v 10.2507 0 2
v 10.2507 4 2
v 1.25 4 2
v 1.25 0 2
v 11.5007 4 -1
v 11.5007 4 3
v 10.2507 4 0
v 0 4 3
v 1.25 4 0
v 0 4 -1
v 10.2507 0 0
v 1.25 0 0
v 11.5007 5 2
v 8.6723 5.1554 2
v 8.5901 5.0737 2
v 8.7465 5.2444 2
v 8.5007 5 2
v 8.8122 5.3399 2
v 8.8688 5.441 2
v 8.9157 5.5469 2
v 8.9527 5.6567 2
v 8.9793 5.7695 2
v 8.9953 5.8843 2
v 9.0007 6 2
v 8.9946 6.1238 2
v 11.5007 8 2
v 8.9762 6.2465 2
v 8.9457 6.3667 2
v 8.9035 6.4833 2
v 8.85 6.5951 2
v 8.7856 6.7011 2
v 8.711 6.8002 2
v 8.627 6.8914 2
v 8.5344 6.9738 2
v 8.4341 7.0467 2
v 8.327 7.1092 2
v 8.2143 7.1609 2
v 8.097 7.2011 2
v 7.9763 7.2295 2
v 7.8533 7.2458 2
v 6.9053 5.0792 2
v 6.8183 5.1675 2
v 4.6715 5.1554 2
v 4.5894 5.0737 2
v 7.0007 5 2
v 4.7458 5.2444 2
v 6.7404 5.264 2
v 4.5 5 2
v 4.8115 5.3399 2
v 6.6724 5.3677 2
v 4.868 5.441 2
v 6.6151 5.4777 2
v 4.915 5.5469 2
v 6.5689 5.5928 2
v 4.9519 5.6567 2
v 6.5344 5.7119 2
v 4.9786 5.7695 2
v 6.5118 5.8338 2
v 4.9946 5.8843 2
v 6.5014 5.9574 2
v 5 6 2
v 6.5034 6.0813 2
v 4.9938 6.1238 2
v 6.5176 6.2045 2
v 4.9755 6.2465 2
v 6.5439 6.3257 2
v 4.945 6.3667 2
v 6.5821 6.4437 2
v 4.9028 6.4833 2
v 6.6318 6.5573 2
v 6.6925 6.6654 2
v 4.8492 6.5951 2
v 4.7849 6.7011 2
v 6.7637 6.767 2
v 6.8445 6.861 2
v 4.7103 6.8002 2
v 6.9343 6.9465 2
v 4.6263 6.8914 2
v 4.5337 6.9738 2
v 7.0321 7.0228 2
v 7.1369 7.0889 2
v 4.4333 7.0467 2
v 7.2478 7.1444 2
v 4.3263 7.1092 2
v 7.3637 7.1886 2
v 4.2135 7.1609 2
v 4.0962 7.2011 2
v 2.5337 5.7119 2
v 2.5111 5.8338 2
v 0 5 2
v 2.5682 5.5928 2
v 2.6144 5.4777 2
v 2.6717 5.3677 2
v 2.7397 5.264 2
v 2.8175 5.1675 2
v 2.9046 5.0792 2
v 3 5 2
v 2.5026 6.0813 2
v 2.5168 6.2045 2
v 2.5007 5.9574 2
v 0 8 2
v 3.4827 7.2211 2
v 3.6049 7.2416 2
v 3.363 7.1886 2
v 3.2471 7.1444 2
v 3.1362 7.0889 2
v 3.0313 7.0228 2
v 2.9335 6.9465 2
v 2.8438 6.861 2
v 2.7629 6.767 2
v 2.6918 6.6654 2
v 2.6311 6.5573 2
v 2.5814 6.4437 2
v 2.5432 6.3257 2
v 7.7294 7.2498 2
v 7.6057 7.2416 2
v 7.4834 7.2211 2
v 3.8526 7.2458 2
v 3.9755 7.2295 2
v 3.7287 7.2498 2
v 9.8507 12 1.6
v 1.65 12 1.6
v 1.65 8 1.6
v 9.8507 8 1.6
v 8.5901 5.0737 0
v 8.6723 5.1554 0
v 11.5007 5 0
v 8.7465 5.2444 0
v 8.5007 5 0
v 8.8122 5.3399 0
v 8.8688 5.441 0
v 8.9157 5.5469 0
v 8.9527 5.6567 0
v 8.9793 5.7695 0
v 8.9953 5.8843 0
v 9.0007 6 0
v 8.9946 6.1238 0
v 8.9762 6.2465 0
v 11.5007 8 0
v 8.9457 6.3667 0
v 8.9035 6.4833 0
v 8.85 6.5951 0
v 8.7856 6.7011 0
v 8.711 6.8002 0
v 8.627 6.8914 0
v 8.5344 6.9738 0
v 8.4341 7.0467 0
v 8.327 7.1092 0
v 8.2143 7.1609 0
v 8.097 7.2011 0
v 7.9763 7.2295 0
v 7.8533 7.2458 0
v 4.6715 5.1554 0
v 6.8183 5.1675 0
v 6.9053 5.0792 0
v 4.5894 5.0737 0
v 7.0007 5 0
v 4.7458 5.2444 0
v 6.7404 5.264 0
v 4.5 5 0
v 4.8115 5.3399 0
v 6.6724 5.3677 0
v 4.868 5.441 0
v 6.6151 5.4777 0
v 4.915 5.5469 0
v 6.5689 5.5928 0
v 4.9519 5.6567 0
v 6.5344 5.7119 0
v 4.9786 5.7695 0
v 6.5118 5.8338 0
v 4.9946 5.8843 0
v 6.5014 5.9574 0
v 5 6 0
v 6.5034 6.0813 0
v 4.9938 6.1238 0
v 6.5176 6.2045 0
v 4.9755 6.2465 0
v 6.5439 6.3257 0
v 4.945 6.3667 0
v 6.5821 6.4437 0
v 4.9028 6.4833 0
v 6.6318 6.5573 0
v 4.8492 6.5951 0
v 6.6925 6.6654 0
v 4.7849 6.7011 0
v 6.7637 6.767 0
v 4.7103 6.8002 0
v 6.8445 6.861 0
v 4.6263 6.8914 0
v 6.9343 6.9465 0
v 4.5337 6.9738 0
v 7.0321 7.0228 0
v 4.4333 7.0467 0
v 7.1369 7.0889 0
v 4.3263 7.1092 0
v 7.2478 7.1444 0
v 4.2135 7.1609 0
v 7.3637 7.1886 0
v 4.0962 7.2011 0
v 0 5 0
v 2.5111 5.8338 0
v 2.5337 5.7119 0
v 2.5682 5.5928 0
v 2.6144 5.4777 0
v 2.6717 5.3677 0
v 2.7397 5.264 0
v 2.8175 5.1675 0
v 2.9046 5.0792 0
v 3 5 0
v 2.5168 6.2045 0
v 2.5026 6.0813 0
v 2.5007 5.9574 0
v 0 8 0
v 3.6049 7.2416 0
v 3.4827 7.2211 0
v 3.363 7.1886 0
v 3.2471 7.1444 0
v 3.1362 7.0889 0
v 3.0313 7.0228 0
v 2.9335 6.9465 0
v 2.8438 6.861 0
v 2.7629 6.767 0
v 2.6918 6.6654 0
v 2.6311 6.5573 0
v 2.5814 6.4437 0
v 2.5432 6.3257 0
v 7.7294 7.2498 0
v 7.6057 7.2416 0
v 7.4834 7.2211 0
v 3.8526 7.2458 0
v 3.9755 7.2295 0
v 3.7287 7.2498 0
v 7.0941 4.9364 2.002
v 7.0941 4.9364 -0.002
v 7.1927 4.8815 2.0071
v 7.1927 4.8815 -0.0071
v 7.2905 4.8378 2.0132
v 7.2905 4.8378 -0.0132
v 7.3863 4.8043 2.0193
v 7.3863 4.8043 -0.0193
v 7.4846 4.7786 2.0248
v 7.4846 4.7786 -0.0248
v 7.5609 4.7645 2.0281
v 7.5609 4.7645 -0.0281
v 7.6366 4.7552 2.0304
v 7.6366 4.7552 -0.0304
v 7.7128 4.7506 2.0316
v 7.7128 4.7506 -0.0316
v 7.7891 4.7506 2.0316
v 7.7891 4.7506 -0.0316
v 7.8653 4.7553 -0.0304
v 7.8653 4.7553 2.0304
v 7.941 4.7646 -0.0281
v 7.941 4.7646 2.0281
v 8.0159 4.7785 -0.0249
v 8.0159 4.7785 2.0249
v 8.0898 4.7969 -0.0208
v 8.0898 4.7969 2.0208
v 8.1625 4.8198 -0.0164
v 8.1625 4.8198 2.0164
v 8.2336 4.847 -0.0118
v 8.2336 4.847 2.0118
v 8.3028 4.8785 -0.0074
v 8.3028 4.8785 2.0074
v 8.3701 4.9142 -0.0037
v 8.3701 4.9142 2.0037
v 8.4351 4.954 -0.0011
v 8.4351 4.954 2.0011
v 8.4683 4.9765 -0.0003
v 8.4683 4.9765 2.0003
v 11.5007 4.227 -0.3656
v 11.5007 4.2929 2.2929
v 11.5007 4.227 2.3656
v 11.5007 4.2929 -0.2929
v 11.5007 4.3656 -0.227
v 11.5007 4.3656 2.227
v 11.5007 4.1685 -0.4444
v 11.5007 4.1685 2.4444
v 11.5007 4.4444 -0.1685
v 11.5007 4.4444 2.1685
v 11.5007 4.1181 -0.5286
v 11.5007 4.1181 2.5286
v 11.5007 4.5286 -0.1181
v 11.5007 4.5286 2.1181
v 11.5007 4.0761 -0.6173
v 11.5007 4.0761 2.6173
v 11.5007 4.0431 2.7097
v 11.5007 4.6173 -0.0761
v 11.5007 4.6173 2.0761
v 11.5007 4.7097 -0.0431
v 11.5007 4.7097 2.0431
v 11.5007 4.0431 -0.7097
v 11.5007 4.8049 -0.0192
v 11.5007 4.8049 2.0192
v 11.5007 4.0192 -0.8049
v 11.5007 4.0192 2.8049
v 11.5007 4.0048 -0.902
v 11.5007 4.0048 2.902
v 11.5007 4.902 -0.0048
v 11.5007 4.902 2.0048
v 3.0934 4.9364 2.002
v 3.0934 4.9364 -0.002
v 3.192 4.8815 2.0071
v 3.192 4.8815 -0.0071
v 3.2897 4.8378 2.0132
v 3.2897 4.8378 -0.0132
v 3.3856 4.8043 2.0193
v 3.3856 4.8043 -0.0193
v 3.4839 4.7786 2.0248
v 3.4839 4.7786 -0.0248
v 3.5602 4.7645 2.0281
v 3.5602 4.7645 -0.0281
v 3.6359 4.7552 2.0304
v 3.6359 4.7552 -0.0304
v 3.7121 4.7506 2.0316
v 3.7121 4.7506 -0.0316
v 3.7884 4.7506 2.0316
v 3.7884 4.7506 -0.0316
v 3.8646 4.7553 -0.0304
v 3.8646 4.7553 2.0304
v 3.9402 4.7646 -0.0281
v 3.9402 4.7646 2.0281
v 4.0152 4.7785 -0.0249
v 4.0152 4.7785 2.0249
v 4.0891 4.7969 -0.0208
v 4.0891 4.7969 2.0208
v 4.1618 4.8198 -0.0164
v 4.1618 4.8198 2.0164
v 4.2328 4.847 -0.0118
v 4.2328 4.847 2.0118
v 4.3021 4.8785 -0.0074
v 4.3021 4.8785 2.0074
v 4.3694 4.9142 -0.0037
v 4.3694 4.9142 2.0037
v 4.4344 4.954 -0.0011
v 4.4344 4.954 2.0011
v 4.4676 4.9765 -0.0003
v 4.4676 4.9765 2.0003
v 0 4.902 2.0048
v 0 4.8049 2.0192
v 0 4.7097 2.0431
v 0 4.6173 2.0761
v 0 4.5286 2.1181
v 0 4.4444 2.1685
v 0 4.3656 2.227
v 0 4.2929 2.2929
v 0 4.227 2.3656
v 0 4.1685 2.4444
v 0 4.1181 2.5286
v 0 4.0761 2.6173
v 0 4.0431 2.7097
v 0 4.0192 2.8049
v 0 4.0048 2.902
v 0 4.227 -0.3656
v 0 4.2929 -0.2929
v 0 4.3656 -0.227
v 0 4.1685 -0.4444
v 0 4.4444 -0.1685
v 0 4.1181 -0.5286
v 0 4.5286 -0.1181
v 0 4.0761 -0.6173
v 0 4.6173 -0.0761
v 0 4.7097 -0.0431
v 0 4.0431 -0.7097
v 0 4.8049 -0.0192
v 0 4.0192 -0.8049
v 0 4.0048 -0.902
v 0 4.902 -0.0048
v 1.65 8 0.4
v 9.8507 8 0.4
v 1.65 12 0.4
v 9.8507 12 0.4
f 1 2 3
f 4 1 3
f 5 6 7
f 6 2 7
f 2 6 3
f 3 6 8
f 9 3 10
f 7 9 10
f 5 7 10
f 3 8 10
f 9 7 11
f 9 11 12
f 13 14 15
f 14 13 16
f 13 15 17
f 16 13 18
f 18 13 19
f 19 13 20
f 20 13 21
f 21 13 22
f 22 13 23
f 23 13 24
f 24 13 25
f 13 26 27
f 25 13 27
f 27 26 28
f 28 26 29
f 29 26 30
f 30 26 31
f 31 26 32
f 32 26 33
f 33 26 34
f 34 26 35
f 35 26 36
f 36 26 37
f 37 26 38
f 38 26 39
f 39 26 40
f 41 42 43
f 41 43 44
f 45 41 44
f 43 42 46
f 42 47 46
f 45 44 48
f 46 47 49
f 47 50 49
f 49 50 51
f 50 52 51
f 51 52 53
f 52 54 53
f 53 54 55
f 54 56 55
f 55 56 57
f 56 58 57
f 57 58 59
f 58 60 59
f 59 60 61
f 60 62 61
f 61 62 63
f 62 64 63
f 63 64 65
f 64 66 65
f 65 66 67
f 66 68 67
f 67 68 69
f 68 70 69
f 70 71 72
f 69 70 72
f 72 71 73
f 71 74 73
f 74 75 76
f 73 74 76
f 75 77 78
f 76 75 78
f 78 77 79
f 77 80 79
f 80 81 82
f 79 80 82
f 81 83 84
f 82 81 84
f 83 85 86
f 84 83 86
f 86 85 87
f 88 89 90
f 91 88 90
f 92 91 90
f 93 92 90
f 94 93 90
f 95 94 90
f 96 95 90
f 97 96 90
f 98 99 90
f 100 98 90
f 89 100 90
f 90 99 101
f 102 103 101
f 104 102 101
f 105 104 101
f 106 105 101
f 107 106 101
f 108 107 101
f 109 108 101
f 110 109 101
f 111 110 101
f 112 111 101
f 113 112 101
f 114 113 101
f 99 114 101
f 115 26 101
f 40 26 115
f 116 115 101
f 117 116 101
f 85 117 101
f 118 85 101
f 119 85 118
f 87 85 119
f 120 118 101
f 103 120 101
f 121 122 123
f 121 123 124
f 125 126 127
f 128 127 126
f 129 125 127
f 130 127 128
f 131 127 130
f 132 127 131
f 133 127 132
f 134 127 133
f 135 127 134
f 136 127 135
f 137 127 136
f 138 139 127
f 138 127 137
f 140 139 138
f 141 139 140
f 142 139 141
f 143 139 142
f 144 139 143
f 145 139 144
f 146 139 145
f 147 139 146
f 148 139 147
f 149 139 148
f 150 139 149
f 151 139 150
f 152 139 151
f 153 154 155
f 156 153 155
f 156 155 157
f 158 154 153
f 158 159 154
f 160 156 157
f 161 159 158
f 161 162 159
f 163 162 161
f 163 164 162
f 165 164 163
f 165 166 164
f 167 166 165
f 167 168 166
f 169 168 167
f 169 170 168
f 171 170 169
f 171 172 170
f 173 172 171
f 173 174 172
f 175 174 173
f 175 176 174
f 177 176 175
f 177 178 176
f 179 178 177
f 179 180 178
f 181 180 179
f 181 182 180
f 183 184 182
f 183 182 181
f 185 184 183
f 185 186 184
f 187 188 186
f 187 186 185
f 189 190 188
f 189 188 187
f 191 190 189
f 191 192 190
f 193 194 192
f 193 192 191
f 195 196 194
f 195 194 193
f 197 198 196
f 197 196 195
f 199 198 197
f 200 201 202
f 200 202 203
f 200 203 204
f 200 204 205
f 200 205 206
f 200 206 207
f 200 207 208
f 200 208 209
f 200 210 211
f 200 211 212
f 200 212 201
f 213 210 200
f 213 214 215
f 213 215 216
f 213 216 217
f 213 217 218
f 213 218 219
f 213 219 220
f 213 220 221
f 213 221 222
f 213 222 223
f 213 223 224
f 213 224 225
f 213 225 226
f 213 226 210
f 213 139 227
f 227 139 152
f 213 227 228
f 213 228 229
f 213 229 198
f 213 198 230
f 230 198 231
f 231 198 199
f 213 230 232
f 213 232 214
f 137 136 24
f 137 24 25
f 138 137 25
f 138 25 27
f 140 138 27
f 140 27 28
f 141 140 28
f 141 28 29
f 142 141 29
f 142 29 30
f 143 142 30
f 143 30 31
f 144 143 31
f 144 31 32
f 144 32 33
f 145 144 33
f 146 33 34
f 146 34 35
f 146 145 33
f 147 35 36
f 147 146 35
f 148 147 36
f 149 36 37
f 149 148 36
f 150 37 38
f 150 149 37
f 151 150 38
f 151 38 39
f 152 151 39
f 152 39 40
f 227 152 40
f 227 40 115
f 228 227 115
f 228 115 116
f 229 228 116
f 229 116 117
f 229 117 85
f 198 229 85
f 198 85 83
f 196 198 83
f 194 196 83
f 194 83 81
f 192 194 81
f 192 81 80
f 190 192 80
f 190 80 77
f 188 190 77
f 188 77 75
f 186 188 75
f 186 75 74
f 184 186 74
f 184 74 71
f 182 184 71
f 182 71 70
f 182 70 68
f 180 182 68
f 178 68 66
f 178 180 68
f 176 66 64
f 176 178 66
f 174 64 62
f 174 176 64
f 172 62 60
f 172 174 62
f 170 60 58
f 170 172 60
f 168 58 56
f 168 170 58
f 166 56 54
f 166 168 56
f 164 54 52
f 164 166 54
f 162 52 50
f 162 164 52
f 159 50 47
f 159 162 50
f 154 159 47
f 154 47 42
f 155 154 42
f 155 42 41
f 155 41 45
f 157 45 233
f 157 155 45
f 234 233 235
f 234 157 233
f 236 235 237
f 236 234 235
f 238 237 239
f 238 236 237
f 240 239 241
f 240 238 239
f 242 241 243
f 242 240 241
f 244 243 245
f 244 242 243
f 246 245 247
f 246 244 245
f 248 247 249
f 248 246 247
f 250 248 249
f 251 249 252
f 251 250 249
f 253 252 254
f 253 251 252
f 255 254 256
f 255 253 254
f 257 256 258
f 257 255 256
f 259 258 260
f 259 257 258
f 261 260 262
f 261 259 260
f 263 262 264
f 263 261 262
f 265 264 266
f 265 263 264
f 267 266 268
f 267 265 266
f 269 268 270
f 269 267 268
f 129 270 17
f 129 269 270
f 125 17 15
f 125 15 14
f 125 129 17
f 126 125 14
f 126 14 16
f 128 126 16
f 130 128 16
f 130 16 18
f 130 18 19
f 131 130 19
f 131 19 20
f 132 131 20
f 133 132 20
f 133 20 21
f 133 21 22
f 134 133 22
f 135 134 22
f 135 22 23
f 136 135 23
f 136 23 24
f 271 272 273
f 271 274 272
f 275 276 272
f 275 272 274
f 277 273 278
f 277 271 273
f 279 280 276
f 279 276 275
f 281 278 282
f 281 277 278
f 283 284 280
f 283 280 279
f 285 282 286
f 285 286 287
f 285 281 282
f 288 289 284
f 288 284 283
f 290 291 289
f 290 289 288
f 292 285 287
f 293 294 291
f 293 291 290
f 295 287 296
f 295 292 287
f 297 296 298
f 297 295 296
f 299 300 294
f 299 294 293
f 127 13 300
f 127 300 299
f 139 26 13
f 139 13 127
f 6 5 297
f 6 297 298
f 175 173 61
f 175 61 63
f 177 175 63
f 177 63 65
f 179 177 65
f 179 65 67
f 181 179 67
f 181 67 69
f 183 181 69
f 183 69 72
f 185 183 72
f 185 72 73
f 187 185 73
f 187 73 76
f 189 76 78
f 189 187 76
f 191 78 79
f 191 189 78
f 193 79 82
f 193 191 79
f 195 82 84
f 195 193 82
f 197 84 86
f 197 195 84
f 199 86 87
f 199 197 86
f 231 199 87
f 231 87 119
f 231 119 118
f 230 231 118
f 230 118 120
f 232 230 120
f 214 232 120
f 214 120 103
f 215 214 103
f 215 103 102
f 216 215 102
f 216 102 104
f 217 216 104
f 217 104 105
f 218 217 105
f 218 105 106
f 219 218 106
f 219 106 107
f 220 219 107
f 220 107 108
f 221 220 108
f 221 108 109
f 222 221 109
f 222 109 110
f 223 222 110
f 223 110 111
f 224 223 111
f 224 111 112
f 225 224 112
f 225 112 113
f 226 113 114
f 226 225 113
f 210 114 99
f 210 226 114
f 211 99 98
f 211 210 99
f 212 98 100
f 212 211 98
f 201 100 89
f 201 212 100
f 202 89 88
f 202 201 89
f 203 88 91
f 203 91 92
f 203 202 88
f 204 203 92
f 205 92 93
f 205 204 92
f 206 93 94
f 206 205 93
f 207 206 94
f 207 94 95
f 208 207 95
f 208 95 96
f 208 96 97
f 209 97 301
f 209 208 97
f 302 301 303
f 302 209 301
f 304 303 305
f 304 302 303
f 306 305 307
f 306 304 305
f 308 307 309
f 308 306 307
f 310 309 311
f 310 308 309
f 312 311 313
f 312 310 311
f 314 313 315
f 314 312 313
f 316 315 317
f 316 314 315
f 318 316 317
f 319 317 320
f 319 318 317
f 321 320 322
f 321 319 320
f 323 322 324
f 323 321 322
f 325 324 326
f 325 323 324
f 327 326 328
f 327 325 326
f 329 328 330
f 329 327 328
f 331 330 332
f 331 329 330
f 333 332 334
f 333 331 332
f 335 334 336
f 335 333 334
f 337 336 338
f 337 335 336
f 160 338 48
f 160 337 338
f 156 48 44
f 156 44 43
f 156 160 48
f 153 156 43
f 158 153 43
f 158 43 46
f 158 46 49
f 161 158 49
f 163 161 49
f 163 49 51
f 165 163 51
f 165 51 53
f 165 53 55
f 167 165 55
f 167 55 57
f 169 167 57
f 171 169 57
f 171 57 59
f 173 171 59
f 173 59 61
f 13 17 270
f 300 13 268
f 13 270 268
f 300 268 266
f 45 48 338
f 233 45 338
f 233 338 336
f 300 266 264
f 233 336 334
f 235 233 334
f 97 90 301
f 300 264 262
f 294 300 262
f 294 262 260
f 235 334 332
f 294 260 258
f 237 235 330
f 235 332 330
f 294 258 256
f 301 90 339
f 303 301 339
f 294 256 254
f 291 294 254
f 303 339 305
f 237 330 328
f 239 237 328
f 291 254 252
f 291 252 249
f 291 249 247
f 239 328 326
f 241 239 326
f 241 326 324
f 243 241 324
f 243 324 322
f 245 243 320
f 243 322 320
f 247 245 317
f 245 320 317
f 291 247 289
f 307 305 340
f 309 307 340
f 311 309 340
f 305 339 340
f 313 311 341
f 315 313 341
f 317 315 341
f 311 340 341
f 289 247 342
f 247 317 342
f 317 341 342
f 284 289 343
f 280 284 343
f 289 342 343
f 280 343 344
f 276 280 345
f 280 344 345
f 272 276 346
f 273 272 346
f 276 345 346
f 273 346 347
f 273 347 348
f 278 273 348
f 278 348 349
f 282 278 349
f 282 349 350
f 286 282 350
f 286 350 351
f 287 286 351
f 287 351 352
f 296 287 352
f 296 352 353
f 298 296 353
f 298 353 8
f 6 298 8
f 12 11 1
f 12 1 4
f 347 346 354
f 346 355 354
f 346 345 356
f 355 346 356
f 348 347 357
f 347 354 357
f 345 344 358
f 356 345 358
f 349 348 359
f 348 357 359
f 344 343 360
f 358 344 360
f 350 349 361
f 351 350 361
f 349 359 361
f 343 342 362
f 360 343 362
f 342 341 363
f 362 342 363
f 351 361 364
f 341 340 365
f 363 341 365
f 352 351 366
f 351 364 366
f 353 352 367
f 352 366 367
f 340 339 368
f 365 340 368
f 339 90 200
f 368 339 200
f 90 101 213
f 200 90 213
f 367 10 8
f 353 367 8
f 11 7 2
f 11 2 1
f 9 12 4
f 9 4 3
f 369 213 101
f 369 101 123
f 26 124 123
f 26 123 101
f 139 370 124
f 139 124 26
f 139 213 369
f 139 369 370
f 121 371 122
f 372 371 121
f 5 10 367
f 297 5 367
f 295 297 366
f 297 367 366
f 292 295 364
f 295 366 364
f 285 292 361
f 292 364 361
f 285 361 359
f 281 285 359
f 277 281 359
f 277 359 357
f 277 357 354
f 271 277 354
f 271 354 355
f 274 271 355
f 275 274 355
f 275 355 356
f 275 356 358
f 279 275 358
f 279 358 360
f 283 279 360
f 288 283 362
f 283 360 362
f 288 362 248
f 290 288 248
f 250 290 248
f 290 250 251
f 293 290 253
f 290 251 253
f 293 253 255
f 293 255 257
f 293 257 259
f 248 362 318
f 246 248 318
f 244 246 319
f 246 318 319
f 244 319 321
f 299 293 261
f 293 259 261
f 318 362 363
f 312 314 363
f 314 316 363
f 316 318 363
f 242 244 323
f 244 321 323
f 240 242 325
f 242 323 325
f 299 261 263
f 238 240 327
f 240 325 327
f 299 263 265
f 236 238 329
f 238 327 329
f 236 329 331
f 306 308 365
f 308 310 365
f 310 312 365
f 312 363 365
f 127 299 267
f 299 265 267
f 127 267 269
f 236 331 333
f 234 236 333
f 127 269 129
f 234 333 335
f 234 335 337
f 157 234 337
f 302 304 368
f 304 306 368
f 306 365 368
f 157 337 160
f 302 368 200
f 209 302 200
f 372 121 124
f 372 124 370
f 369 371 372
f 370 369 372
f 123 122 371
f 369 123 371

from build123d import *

# Parameters (mm, degrees)
MODEL_R                 = 1.25
BOSS_EXTRUDE1_DEPTH     = 2
BOSS_EXTRUDE2_DEPTH     = 11.50072
SKETCH2_R               = 1.25
CUT_EXTRUDE1_DEPTH      = 2
CUT_EXTRUDE1_DEPTH_BACK = 4
SKETCH3_W               = 9.00072
SKETCH3_H               = 2
SKETCH3_W_2             = 8.20072
SKETCH3_H_2             = 1.2
CUT_EXTRUDE2_DEPTH      = 4


with BuildPart() as part:
    # Model → Boss-Extrude1 (new body)
    with BuildSketch(Plane.XY):
        Polygon((1.25, 4), (0, 4), (0, 8), (1.25, 8), (1.25, 12), (10.25072, 12), (10.25072, 8), (11.50072, 8), (11.50072, 4), (10.25072, 4), (10.25072, 0), (1.25, 0), align=None)
        with Locations((7.75072, 6)):
            Circle(MODEL_R, mode=Mode.SUBTRACT)
        with Locations((3.75, 6)):
            Circle(MODEL_R, mode=Mode.SUBTRACT)
    extrude(amount=BOSS_EXTRUDE1_DEPTH)

    # Sketch1 → Boss-Extrude2 (add)
    with BuildSketch(Plane.ZY):
        with BuildLine():
            Line((2, 4), (2, 5))
            ThreePointArc((2, 5), (2.292893219, 4.292893219), (3, 4))
            Line((3, 4), (2, 4))
        make_face()
        with BuildLine():
            Line((0, 4), (-1, 4))
            ThreePointArc((-1, 4), (-0.292893219, 4.292893219), (0, 5))
            Line((0, 5), (0, 4))
        make_face()
    extrude(amount=-BOSS_EXTRUDE2_DEPTH)

    # Sketch2 → Cut-Extrude1 (cut, two sides)
    with BuildSketch(Plane.XY.offset(2)) as cut_extrude1_sk:
        with Locations((3.75, 6)):
            Circle(SKETCH2_R)
        with Locations((7.75072, 6)):
            Circle(SKETCH2_R)
    extrude(amount=CUT_EXTRUDE1_DEPTH, mode=Mode.SUBTRACT)
    extrude(cut_extrude1_sk.sketch, amount=-CUT_EXTRUDE1_DEPTH_BACK, mode=Mode.SUBTRACT)

    # Sketch3 → Cut-Extrude2 (cut)
    with BuildSketch(Plane(origin=(0, 12, 0), x_dir=(1, 0, 0), z_dir=(0, 1, 0))):
        with Locations((5.75036, -1)):
            Rectangle(SKETCH3_W, SKETCH3_H)
        with Locations((5.75036, -1)):
            Rectangle(SKETCH3_W_2, SKETCH3_H_2, mode=Mode.SUBTRACT)
    extrude(amount=-CUT_EXTRUDE2_DEPTH, mode=Mode.SUBTRACT)


solid = part.part
